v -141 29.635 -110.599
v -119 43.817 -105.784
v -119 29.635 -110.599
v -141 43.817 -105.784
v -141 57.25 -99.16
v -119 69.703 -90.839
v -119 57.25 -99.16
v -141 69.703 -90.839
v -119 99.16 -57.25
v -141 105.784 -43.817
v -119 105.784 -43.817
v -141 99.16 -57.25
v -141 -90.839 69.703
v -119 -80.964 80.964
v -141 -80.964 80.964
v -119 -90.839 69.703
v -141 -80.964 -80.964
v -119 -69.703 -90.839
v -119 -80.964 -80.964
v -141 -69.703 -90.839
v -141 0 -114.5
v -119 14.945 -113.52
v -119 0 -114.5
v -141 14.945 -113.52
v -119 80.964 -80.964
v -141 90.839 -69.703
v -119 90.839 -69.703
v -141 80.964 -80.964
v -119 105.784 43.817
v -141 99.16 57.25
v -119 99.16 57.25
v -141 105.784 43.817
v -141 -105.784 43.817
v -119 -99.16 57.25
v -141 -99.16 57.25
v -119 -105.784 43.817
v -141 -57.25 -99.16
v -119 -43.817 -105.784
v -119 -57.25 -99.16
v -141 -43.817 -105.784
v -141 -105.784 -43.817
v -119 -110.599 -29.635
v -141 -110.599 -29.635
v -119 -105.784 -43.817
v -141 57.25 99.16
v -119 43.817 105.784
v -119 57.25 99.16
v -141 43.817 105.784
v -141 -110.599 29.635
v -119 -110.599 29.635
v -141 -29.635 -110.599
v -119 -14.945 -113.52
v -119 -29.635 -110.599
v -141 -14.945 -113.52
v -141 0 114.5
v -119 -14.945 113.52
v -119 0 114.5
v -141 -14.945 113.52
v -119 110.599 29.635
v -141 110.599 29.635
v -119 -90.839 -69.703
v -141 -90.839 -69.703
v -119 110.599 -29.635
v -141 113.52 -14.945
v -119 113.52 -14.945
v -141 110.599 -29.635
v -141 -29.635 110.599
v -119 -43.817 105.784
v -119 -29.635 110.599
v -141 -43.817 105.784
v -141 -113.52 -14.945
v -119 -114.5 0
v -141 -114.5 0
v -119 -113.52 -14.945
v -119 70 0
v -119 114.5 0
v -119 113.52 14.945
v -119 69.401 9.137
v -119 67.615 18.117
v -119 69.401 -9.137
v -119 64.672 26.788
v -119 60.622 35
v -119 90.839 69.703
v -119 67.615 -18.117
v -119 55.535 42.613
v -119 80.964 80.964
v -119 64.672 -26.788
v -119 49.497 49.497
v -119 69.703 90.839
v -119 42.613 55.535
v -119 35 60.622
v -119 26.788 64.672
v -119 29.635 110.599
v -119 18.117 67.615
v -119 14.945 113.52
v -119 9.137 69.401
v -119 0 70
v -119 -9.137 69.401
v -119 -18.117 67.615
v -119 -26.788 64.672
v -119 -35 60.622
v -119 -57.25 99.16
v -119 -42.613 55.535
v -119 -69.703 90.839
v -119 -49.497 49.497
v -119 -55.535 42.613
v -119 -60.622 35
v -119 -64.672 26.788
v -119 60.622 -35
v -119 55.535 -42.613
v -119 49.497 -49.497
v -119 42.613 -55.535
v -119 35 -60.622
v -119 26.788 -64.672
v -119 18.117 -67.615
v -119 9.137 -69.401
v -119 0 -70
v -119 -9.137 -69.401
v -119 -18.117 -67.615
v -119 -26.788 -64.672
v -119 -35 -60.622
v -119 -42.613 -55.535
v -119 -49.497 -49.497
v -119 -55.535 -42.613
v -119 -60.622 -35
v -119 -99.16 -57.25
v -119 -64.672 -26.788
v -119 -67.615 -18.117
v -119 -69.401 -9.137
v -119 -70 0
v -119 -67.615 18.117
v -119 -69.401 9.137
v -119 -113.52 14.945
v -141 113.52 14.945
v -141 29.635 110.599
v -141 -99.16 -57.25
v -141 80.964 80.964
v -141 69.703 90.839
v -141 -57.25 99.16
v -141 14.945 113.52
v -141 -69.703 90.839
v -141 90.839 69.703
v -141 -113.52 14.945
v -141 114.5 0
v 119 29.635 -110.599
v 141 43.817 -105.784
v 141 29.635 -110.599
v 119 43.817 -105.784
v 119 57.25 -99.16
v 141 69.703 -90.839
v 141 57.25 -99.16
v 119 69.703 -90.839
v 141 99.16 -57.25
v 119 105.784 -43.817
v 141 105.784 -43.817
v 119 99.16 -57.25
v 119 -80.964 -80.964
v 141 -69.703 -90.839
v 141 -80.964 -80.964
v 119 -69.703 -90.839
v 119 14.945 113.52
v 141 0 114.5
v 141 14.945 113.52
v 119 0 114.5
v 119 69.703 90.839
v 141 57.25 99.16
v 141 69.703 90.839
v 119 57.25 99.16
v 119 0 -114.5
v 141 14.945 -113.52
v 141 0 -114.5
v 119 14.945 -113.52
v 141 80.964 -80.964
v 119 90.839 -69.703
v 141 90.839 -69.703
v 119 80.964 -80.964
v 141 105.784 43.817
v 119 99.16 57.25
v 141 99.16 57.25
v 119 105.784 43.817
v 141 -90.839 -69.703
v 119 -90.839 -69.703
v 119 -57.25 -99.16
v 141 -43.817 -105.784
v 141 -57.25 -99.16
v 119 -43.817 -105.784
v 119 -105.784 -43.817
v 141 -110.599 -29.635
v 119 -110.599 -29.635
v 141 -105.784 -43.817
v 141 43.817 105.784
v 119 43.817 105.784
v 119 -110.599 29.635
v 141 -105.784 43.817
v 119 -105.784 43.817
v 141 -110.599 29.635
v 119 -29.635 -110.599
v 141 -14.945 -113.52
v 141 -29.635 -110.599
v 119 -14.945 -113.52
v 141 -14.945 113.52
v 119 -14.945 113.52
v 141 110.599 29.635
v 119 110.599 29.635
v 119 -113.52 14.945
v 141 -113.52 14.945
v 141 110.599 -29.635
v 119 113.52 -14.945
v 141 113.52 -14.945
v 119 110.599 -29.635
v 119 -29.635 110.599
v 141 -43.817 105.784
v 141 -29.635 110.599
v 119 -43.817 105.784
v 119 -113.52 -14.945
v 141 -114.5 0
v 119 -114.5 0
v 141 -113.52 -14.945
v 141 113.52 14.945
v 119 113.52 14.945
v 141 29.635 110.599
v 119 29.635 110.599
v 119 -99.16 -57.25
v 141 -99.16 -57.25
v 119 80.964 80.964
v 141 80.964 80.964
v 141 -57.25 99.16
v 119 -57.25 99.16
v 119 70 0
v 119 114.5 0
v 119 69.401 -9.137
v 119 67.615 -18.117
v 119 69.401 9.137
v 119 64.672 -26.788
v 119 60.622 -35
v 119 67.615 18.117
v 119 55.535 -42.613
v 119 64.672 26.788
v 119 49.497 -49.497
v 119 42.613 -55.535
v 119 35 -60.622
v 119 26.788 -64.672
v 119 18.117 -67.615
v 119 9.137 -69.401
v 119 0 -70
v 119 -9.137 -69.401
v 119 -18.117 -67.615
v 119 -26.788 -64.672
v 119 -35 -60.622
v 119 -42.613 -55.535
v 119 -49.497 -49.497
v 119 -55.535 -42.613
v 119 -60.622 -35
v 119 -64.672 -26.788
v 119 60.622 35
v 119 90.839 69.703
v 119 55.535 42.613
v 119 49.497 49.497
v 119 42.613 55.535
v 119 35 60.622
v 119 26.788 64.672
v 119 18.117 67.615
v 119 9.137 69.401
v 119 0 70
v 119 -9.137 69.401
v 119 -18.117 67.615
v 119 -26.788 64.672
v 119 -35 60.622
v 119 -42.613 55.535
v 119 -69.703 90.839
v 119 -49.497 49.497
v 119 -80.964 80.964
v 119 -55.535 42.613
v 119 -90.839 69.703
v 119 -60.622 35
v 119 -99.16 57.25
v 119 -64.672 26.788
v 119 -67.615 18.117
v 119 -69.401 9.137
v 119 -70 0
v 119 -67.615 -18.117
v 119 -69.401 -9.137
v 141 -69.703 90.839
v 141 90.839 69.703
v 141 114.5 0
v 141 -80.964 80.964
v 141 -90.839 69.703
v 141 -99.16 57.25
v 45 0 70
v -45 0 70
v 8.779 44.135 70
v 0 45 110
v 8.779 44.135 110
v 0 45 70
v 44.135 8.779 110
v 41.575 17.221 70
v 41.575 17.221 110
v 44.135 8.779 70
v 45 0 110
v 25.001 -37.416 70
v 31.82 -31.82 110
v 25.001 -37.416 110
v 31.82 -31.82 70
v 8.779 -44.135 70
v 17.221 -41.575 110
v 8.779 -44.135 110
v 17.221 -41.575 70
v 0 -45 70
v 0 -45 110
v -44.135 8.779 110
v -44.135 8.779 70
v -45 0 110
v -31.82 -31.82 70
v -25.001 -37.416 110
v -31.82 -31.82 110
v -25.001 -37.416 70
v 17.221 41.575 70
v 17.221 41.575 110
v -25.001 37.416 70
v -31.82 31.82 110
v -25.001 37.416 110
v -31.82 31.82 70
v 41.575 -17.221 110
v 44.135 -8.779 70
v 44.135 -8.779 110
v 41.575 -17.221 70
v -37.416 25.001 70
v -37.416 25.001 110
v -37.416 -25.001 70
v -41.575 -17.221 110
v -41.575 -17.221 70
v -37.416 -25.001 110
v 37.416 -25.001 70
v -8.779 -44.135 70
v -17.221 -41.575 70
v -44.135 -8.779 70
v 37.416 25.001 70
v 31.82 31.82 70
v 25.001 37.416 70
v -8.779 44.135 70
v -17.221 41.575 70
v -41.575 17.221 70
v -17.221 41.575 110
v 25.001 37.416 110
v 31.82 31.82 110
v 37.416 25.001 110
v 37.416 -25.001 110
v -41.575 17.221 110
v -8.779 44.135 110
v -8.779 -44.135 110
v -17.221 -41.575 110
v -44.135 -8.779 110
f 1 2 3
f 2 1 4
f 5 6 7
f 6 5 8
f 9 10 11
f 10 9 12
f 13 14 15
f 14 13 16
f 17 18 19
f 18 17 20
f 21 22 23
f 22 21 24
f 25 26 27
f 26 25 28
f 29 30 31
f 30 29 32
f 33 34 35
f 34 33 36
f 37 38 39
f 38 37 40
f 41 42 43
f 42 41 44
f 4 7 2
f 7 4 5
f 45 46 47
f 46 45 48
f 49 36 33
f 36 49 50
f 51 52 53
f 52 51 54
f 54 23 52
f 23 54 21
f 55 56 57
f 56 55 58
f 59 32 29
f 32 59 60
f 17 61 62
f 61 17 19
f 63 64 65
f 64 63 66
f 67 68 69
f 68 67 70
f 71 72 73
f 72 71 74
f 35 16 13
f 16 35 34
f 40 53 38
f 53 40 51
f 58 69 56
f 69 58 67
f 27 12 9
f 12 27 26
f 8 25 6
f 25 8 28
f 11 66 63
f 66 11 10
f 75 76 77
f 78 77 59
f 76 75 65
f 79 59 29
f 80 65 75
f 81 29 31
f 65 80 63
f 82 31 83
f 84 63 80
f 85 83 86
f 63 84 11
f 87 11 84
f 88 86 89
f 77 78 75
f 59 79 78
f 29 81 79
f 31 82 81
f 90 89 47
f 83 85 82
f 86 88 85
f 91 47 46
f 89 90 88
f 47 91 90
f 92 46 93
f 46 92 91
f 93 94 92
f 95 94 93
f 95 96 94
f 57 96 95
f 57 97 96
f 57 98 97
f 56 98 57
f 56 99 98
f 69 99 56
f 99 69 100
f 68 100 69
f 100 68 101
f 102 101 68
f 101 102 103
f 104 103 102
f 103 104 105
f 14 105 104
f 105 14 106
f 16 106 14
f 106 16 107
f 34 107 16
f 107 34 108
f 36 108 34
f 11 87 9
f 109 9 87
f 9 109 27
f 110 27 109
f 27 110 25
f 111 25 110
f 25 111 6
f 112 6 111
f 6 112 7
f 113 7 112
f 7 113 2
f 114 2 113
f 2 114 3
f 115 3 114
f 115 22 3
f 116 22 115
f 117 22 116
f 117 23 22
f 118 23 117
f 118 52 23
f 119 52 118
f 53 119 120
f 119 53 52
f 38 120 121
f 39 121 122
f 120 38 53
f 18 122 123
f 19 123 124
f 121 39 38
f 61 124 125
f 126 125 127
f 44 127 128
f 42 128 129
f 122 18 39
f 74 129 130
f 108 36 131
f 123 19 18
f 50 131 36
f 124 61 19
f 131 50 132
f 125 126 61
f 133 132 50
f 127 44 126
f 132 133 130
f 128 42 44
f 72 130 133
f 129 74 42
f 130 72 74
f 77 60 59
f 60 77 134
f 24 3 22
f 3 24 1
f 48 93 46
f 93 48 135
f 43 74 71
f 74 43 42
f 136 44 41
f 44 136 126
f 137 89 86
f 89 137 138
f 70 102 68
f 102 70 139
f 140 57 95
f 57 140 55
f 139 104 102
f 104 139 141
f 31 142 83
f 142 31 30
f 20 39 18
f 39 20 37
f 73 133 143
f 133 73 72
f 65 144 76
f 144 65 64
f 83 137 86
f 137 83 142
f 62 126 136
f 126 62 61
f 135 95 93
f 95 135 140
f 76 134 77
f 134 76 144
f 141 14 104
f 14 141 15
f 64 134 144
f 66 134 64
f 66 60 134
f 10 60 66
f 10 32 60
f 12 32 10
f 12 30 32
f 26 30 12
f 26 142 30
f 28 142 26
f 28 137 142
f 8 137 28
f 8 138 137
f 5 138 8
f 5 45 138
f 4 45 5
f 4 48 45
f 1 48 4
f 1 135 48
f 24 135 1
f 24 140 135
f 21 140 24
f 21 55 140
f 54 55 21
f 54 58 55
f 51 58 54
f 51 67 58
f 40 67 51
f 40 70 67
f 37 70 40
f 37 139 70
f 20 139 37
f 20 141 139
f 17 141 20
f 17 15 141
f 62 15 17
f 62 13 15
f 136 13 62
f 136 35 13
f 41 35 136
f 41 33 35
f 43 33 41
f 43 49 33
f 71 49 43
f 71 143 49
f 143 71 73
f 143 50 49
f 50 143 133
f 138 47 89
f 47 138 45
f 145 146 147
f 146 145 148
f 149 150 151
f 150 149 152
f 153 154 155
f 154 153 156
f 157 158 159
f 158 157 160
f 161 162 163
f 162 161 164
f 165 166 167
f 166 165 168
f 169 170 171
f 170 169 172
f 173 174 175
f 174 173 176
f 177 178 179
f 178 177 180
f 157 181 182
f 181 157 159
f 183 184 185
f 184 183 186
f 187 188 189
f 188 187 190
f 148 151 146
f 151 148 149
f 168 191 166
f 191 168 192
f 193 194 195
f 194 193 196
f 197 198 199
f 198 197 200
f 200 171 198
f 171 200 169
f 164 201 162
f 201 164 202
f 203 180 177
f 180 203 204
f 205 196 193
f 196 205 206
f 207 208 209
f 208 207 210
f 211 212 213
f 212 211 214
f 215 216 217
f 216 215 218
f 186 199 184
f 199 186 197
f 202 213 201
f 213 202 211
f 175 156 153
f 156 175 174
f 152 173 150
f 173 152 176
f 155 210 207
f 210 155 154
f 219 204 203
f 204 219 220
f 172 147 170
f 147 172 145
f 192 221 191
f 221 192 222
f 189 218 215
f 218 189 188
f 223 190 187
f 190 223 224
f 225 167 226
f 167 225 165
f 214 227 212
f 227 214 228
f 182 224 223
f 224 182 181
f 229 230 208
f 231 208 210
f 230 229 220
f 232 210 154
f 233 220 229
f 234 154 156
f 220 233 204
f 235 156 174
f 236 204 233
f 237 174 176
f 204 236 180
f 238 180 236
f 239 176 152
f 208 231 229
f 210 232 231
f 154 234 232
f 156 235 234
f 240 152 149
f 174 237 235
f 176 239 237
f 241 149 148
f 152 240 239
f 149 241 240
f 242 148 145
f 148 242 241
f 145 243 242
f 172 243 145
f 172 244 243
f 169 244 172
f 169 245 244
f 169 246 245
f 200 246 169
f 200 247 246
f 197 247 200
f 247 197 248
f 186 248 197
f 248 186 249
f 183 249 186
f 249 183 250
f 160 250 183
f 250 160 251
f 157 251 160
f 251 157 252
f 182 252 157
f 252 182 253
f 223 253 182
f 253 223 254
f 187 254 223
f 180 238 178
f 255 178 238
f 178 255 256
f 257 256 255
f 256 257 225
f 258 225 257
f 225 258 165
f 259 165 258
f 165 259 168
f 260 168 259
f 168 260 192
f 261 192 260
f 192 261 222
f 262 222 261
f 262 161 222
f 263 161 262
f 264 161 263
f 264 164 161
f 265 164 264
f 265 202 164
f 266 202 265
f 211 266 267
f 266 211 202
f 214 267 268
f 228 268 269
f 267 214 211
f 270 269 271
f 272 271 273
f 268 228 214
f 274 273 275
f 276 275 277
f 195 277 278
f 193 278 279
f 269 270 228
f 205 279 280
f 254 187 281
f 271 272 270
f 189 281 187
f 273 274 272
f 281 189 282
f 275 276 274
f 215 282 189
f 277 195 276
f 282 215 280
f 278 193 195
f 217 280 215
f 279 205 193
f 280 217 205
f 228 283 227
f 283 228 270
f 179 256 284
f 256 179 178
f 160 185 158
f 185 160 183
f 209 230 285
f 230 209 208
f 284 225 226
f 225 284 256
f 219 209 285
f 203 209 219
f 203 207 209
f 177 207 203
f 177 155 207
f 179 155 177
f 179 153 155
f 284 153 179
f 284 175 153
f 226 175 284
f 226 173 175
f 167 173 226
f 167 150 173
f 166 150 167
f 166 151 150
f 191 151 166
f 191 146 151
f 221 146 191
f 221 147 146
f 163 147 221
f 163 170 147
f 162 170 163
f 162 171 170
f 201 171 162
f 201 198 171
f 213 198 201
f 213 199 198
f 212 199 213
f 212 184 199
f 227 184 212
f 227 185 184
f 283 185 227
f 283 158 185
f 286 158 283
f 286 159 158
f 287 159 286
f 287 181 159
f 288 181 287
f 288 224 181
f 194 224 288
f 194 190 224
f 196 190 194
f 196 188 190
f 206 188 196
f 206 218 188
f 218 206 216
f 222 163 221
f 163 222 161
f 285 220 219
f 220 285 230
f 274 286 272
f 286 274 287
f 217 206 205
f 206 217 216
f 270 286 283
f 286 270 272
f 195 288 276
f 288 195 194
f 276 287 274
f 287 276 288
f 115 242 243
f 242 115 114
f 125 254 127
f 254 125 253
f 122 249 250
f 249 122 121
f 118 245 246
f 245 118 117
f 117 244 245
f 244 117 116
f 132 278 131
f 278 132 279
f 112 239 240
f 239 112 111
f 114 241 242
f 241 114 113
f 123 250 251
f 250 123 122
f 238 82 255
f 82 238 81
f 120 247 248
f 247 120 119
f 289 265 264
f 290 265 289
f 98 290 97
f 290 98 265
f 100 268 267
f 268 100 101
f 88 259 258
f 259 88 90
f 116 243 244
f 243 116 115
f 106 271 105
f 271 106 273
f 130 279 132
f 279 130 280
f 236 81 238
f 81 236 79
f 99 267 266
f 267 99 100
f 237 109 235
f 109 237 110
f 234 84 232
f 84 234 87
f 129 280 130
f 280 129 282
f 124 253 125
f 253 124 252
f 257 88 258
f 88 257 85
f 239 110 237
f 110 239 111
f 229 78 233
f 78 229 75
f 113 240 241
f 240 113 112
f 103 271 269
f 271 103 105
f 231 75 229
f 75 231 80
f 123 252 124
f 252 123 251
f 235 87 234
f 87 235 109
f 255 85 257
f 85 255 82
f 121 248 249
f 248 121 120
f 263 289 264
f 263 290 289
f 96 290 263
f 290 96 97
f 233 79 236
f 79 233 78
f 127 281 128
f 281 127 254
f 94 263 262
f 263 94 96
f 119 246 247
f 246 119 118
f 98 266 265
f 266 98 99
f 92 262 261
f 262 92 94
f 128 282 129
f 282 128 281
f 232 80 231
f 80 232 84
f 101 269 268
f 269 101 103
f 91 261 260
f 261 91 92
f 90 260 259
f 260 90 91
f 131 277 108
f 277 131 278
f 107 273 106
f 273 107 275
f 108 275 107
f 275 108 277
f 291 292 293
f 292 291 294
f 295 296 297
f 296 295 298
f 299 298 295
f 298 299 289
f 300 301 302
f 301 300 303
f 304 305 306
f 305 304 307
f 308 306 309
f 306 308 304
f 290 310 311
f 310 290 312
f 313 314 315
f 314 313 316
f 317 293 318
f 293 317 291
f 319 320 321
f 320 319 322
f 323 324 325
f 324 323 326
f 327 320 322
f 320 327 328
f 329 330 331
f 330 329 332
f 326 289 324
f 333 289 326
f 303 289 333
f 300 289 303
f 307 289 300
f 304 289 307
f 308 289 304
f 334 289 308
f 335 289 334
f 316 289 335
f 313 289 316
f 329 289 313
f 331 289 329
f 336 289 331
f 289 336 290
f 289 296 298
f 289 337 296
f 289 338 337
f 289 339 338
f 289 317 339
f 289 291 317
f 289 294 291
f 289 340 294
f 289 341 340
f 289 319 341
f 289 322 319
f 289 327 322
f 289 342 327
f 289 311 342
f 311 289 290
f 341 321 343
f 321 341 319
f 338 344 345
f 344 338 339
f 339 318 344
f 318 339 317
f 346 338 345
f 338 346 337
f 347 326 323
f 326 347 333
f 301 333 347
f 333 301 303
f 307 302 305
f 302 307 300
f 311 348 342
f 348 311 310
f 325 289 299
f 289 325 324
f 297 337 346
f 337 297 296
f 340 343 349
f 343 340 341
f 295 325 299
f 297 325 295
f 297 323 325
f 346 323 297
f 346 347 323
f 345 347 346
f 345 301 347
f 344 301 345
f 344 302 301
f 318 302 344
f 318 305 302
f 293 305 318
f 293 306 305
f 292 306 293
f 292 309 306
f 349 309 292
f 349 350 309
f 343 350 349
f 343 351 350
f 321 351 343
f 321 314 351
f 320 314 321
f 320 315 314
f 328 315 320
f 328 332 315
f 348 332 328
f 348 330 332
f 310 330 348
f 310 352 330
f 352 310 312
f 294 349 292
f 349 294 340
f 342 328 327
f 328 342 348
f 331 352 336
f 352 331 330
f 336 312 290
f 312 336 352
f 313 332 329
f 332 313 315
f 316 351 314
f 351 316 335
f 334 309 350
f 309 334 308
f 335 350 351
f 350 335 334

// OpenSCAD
// Swing-check valve, 4" flanged.
//
// @part valve_check_swing
// @kind valve
// @category valve.check.swing
// @display-name "Swing Check Valve (4\" Flanged)"
// @mfg viking
// @mfg-pn F-1
// @listing UL FM
// @price-usd 310.00
// @install-minutes 30
// @crew foreman
// @param size_in enum[2,2.5,3,4,6,8] default=4 label="Size" unit="in"
// @port run_in  position=[-0.13,0,0] direction=[-1,0,0] style=flanged.150 size_in=4 role=run_a
// @port run_out position=[0.13,0,0]  direction=[1,0,0]  style=flanged.150 size_in=4 role=run_b

body_l = 260;
body_d = 140;
flange_od = 229;
flange_t = 22;
union() {
    rotate([0, 90, 0])
        cylinder(h = body_l, d = body_d, center = true, $fn = 48);
    for (sgn = [-1, 1])
        translate([sgn * body_l / 2, 0, 0]) rotate([0, 90, 0])
            cylinder(h = flange_t, d = flange_od, center = true, $fn = 48);
    // Bonnet / cap on top
    translate([0, 0, body_d / 2])
        cylinder(h = 40, d = 90, $fn = 32);
}
